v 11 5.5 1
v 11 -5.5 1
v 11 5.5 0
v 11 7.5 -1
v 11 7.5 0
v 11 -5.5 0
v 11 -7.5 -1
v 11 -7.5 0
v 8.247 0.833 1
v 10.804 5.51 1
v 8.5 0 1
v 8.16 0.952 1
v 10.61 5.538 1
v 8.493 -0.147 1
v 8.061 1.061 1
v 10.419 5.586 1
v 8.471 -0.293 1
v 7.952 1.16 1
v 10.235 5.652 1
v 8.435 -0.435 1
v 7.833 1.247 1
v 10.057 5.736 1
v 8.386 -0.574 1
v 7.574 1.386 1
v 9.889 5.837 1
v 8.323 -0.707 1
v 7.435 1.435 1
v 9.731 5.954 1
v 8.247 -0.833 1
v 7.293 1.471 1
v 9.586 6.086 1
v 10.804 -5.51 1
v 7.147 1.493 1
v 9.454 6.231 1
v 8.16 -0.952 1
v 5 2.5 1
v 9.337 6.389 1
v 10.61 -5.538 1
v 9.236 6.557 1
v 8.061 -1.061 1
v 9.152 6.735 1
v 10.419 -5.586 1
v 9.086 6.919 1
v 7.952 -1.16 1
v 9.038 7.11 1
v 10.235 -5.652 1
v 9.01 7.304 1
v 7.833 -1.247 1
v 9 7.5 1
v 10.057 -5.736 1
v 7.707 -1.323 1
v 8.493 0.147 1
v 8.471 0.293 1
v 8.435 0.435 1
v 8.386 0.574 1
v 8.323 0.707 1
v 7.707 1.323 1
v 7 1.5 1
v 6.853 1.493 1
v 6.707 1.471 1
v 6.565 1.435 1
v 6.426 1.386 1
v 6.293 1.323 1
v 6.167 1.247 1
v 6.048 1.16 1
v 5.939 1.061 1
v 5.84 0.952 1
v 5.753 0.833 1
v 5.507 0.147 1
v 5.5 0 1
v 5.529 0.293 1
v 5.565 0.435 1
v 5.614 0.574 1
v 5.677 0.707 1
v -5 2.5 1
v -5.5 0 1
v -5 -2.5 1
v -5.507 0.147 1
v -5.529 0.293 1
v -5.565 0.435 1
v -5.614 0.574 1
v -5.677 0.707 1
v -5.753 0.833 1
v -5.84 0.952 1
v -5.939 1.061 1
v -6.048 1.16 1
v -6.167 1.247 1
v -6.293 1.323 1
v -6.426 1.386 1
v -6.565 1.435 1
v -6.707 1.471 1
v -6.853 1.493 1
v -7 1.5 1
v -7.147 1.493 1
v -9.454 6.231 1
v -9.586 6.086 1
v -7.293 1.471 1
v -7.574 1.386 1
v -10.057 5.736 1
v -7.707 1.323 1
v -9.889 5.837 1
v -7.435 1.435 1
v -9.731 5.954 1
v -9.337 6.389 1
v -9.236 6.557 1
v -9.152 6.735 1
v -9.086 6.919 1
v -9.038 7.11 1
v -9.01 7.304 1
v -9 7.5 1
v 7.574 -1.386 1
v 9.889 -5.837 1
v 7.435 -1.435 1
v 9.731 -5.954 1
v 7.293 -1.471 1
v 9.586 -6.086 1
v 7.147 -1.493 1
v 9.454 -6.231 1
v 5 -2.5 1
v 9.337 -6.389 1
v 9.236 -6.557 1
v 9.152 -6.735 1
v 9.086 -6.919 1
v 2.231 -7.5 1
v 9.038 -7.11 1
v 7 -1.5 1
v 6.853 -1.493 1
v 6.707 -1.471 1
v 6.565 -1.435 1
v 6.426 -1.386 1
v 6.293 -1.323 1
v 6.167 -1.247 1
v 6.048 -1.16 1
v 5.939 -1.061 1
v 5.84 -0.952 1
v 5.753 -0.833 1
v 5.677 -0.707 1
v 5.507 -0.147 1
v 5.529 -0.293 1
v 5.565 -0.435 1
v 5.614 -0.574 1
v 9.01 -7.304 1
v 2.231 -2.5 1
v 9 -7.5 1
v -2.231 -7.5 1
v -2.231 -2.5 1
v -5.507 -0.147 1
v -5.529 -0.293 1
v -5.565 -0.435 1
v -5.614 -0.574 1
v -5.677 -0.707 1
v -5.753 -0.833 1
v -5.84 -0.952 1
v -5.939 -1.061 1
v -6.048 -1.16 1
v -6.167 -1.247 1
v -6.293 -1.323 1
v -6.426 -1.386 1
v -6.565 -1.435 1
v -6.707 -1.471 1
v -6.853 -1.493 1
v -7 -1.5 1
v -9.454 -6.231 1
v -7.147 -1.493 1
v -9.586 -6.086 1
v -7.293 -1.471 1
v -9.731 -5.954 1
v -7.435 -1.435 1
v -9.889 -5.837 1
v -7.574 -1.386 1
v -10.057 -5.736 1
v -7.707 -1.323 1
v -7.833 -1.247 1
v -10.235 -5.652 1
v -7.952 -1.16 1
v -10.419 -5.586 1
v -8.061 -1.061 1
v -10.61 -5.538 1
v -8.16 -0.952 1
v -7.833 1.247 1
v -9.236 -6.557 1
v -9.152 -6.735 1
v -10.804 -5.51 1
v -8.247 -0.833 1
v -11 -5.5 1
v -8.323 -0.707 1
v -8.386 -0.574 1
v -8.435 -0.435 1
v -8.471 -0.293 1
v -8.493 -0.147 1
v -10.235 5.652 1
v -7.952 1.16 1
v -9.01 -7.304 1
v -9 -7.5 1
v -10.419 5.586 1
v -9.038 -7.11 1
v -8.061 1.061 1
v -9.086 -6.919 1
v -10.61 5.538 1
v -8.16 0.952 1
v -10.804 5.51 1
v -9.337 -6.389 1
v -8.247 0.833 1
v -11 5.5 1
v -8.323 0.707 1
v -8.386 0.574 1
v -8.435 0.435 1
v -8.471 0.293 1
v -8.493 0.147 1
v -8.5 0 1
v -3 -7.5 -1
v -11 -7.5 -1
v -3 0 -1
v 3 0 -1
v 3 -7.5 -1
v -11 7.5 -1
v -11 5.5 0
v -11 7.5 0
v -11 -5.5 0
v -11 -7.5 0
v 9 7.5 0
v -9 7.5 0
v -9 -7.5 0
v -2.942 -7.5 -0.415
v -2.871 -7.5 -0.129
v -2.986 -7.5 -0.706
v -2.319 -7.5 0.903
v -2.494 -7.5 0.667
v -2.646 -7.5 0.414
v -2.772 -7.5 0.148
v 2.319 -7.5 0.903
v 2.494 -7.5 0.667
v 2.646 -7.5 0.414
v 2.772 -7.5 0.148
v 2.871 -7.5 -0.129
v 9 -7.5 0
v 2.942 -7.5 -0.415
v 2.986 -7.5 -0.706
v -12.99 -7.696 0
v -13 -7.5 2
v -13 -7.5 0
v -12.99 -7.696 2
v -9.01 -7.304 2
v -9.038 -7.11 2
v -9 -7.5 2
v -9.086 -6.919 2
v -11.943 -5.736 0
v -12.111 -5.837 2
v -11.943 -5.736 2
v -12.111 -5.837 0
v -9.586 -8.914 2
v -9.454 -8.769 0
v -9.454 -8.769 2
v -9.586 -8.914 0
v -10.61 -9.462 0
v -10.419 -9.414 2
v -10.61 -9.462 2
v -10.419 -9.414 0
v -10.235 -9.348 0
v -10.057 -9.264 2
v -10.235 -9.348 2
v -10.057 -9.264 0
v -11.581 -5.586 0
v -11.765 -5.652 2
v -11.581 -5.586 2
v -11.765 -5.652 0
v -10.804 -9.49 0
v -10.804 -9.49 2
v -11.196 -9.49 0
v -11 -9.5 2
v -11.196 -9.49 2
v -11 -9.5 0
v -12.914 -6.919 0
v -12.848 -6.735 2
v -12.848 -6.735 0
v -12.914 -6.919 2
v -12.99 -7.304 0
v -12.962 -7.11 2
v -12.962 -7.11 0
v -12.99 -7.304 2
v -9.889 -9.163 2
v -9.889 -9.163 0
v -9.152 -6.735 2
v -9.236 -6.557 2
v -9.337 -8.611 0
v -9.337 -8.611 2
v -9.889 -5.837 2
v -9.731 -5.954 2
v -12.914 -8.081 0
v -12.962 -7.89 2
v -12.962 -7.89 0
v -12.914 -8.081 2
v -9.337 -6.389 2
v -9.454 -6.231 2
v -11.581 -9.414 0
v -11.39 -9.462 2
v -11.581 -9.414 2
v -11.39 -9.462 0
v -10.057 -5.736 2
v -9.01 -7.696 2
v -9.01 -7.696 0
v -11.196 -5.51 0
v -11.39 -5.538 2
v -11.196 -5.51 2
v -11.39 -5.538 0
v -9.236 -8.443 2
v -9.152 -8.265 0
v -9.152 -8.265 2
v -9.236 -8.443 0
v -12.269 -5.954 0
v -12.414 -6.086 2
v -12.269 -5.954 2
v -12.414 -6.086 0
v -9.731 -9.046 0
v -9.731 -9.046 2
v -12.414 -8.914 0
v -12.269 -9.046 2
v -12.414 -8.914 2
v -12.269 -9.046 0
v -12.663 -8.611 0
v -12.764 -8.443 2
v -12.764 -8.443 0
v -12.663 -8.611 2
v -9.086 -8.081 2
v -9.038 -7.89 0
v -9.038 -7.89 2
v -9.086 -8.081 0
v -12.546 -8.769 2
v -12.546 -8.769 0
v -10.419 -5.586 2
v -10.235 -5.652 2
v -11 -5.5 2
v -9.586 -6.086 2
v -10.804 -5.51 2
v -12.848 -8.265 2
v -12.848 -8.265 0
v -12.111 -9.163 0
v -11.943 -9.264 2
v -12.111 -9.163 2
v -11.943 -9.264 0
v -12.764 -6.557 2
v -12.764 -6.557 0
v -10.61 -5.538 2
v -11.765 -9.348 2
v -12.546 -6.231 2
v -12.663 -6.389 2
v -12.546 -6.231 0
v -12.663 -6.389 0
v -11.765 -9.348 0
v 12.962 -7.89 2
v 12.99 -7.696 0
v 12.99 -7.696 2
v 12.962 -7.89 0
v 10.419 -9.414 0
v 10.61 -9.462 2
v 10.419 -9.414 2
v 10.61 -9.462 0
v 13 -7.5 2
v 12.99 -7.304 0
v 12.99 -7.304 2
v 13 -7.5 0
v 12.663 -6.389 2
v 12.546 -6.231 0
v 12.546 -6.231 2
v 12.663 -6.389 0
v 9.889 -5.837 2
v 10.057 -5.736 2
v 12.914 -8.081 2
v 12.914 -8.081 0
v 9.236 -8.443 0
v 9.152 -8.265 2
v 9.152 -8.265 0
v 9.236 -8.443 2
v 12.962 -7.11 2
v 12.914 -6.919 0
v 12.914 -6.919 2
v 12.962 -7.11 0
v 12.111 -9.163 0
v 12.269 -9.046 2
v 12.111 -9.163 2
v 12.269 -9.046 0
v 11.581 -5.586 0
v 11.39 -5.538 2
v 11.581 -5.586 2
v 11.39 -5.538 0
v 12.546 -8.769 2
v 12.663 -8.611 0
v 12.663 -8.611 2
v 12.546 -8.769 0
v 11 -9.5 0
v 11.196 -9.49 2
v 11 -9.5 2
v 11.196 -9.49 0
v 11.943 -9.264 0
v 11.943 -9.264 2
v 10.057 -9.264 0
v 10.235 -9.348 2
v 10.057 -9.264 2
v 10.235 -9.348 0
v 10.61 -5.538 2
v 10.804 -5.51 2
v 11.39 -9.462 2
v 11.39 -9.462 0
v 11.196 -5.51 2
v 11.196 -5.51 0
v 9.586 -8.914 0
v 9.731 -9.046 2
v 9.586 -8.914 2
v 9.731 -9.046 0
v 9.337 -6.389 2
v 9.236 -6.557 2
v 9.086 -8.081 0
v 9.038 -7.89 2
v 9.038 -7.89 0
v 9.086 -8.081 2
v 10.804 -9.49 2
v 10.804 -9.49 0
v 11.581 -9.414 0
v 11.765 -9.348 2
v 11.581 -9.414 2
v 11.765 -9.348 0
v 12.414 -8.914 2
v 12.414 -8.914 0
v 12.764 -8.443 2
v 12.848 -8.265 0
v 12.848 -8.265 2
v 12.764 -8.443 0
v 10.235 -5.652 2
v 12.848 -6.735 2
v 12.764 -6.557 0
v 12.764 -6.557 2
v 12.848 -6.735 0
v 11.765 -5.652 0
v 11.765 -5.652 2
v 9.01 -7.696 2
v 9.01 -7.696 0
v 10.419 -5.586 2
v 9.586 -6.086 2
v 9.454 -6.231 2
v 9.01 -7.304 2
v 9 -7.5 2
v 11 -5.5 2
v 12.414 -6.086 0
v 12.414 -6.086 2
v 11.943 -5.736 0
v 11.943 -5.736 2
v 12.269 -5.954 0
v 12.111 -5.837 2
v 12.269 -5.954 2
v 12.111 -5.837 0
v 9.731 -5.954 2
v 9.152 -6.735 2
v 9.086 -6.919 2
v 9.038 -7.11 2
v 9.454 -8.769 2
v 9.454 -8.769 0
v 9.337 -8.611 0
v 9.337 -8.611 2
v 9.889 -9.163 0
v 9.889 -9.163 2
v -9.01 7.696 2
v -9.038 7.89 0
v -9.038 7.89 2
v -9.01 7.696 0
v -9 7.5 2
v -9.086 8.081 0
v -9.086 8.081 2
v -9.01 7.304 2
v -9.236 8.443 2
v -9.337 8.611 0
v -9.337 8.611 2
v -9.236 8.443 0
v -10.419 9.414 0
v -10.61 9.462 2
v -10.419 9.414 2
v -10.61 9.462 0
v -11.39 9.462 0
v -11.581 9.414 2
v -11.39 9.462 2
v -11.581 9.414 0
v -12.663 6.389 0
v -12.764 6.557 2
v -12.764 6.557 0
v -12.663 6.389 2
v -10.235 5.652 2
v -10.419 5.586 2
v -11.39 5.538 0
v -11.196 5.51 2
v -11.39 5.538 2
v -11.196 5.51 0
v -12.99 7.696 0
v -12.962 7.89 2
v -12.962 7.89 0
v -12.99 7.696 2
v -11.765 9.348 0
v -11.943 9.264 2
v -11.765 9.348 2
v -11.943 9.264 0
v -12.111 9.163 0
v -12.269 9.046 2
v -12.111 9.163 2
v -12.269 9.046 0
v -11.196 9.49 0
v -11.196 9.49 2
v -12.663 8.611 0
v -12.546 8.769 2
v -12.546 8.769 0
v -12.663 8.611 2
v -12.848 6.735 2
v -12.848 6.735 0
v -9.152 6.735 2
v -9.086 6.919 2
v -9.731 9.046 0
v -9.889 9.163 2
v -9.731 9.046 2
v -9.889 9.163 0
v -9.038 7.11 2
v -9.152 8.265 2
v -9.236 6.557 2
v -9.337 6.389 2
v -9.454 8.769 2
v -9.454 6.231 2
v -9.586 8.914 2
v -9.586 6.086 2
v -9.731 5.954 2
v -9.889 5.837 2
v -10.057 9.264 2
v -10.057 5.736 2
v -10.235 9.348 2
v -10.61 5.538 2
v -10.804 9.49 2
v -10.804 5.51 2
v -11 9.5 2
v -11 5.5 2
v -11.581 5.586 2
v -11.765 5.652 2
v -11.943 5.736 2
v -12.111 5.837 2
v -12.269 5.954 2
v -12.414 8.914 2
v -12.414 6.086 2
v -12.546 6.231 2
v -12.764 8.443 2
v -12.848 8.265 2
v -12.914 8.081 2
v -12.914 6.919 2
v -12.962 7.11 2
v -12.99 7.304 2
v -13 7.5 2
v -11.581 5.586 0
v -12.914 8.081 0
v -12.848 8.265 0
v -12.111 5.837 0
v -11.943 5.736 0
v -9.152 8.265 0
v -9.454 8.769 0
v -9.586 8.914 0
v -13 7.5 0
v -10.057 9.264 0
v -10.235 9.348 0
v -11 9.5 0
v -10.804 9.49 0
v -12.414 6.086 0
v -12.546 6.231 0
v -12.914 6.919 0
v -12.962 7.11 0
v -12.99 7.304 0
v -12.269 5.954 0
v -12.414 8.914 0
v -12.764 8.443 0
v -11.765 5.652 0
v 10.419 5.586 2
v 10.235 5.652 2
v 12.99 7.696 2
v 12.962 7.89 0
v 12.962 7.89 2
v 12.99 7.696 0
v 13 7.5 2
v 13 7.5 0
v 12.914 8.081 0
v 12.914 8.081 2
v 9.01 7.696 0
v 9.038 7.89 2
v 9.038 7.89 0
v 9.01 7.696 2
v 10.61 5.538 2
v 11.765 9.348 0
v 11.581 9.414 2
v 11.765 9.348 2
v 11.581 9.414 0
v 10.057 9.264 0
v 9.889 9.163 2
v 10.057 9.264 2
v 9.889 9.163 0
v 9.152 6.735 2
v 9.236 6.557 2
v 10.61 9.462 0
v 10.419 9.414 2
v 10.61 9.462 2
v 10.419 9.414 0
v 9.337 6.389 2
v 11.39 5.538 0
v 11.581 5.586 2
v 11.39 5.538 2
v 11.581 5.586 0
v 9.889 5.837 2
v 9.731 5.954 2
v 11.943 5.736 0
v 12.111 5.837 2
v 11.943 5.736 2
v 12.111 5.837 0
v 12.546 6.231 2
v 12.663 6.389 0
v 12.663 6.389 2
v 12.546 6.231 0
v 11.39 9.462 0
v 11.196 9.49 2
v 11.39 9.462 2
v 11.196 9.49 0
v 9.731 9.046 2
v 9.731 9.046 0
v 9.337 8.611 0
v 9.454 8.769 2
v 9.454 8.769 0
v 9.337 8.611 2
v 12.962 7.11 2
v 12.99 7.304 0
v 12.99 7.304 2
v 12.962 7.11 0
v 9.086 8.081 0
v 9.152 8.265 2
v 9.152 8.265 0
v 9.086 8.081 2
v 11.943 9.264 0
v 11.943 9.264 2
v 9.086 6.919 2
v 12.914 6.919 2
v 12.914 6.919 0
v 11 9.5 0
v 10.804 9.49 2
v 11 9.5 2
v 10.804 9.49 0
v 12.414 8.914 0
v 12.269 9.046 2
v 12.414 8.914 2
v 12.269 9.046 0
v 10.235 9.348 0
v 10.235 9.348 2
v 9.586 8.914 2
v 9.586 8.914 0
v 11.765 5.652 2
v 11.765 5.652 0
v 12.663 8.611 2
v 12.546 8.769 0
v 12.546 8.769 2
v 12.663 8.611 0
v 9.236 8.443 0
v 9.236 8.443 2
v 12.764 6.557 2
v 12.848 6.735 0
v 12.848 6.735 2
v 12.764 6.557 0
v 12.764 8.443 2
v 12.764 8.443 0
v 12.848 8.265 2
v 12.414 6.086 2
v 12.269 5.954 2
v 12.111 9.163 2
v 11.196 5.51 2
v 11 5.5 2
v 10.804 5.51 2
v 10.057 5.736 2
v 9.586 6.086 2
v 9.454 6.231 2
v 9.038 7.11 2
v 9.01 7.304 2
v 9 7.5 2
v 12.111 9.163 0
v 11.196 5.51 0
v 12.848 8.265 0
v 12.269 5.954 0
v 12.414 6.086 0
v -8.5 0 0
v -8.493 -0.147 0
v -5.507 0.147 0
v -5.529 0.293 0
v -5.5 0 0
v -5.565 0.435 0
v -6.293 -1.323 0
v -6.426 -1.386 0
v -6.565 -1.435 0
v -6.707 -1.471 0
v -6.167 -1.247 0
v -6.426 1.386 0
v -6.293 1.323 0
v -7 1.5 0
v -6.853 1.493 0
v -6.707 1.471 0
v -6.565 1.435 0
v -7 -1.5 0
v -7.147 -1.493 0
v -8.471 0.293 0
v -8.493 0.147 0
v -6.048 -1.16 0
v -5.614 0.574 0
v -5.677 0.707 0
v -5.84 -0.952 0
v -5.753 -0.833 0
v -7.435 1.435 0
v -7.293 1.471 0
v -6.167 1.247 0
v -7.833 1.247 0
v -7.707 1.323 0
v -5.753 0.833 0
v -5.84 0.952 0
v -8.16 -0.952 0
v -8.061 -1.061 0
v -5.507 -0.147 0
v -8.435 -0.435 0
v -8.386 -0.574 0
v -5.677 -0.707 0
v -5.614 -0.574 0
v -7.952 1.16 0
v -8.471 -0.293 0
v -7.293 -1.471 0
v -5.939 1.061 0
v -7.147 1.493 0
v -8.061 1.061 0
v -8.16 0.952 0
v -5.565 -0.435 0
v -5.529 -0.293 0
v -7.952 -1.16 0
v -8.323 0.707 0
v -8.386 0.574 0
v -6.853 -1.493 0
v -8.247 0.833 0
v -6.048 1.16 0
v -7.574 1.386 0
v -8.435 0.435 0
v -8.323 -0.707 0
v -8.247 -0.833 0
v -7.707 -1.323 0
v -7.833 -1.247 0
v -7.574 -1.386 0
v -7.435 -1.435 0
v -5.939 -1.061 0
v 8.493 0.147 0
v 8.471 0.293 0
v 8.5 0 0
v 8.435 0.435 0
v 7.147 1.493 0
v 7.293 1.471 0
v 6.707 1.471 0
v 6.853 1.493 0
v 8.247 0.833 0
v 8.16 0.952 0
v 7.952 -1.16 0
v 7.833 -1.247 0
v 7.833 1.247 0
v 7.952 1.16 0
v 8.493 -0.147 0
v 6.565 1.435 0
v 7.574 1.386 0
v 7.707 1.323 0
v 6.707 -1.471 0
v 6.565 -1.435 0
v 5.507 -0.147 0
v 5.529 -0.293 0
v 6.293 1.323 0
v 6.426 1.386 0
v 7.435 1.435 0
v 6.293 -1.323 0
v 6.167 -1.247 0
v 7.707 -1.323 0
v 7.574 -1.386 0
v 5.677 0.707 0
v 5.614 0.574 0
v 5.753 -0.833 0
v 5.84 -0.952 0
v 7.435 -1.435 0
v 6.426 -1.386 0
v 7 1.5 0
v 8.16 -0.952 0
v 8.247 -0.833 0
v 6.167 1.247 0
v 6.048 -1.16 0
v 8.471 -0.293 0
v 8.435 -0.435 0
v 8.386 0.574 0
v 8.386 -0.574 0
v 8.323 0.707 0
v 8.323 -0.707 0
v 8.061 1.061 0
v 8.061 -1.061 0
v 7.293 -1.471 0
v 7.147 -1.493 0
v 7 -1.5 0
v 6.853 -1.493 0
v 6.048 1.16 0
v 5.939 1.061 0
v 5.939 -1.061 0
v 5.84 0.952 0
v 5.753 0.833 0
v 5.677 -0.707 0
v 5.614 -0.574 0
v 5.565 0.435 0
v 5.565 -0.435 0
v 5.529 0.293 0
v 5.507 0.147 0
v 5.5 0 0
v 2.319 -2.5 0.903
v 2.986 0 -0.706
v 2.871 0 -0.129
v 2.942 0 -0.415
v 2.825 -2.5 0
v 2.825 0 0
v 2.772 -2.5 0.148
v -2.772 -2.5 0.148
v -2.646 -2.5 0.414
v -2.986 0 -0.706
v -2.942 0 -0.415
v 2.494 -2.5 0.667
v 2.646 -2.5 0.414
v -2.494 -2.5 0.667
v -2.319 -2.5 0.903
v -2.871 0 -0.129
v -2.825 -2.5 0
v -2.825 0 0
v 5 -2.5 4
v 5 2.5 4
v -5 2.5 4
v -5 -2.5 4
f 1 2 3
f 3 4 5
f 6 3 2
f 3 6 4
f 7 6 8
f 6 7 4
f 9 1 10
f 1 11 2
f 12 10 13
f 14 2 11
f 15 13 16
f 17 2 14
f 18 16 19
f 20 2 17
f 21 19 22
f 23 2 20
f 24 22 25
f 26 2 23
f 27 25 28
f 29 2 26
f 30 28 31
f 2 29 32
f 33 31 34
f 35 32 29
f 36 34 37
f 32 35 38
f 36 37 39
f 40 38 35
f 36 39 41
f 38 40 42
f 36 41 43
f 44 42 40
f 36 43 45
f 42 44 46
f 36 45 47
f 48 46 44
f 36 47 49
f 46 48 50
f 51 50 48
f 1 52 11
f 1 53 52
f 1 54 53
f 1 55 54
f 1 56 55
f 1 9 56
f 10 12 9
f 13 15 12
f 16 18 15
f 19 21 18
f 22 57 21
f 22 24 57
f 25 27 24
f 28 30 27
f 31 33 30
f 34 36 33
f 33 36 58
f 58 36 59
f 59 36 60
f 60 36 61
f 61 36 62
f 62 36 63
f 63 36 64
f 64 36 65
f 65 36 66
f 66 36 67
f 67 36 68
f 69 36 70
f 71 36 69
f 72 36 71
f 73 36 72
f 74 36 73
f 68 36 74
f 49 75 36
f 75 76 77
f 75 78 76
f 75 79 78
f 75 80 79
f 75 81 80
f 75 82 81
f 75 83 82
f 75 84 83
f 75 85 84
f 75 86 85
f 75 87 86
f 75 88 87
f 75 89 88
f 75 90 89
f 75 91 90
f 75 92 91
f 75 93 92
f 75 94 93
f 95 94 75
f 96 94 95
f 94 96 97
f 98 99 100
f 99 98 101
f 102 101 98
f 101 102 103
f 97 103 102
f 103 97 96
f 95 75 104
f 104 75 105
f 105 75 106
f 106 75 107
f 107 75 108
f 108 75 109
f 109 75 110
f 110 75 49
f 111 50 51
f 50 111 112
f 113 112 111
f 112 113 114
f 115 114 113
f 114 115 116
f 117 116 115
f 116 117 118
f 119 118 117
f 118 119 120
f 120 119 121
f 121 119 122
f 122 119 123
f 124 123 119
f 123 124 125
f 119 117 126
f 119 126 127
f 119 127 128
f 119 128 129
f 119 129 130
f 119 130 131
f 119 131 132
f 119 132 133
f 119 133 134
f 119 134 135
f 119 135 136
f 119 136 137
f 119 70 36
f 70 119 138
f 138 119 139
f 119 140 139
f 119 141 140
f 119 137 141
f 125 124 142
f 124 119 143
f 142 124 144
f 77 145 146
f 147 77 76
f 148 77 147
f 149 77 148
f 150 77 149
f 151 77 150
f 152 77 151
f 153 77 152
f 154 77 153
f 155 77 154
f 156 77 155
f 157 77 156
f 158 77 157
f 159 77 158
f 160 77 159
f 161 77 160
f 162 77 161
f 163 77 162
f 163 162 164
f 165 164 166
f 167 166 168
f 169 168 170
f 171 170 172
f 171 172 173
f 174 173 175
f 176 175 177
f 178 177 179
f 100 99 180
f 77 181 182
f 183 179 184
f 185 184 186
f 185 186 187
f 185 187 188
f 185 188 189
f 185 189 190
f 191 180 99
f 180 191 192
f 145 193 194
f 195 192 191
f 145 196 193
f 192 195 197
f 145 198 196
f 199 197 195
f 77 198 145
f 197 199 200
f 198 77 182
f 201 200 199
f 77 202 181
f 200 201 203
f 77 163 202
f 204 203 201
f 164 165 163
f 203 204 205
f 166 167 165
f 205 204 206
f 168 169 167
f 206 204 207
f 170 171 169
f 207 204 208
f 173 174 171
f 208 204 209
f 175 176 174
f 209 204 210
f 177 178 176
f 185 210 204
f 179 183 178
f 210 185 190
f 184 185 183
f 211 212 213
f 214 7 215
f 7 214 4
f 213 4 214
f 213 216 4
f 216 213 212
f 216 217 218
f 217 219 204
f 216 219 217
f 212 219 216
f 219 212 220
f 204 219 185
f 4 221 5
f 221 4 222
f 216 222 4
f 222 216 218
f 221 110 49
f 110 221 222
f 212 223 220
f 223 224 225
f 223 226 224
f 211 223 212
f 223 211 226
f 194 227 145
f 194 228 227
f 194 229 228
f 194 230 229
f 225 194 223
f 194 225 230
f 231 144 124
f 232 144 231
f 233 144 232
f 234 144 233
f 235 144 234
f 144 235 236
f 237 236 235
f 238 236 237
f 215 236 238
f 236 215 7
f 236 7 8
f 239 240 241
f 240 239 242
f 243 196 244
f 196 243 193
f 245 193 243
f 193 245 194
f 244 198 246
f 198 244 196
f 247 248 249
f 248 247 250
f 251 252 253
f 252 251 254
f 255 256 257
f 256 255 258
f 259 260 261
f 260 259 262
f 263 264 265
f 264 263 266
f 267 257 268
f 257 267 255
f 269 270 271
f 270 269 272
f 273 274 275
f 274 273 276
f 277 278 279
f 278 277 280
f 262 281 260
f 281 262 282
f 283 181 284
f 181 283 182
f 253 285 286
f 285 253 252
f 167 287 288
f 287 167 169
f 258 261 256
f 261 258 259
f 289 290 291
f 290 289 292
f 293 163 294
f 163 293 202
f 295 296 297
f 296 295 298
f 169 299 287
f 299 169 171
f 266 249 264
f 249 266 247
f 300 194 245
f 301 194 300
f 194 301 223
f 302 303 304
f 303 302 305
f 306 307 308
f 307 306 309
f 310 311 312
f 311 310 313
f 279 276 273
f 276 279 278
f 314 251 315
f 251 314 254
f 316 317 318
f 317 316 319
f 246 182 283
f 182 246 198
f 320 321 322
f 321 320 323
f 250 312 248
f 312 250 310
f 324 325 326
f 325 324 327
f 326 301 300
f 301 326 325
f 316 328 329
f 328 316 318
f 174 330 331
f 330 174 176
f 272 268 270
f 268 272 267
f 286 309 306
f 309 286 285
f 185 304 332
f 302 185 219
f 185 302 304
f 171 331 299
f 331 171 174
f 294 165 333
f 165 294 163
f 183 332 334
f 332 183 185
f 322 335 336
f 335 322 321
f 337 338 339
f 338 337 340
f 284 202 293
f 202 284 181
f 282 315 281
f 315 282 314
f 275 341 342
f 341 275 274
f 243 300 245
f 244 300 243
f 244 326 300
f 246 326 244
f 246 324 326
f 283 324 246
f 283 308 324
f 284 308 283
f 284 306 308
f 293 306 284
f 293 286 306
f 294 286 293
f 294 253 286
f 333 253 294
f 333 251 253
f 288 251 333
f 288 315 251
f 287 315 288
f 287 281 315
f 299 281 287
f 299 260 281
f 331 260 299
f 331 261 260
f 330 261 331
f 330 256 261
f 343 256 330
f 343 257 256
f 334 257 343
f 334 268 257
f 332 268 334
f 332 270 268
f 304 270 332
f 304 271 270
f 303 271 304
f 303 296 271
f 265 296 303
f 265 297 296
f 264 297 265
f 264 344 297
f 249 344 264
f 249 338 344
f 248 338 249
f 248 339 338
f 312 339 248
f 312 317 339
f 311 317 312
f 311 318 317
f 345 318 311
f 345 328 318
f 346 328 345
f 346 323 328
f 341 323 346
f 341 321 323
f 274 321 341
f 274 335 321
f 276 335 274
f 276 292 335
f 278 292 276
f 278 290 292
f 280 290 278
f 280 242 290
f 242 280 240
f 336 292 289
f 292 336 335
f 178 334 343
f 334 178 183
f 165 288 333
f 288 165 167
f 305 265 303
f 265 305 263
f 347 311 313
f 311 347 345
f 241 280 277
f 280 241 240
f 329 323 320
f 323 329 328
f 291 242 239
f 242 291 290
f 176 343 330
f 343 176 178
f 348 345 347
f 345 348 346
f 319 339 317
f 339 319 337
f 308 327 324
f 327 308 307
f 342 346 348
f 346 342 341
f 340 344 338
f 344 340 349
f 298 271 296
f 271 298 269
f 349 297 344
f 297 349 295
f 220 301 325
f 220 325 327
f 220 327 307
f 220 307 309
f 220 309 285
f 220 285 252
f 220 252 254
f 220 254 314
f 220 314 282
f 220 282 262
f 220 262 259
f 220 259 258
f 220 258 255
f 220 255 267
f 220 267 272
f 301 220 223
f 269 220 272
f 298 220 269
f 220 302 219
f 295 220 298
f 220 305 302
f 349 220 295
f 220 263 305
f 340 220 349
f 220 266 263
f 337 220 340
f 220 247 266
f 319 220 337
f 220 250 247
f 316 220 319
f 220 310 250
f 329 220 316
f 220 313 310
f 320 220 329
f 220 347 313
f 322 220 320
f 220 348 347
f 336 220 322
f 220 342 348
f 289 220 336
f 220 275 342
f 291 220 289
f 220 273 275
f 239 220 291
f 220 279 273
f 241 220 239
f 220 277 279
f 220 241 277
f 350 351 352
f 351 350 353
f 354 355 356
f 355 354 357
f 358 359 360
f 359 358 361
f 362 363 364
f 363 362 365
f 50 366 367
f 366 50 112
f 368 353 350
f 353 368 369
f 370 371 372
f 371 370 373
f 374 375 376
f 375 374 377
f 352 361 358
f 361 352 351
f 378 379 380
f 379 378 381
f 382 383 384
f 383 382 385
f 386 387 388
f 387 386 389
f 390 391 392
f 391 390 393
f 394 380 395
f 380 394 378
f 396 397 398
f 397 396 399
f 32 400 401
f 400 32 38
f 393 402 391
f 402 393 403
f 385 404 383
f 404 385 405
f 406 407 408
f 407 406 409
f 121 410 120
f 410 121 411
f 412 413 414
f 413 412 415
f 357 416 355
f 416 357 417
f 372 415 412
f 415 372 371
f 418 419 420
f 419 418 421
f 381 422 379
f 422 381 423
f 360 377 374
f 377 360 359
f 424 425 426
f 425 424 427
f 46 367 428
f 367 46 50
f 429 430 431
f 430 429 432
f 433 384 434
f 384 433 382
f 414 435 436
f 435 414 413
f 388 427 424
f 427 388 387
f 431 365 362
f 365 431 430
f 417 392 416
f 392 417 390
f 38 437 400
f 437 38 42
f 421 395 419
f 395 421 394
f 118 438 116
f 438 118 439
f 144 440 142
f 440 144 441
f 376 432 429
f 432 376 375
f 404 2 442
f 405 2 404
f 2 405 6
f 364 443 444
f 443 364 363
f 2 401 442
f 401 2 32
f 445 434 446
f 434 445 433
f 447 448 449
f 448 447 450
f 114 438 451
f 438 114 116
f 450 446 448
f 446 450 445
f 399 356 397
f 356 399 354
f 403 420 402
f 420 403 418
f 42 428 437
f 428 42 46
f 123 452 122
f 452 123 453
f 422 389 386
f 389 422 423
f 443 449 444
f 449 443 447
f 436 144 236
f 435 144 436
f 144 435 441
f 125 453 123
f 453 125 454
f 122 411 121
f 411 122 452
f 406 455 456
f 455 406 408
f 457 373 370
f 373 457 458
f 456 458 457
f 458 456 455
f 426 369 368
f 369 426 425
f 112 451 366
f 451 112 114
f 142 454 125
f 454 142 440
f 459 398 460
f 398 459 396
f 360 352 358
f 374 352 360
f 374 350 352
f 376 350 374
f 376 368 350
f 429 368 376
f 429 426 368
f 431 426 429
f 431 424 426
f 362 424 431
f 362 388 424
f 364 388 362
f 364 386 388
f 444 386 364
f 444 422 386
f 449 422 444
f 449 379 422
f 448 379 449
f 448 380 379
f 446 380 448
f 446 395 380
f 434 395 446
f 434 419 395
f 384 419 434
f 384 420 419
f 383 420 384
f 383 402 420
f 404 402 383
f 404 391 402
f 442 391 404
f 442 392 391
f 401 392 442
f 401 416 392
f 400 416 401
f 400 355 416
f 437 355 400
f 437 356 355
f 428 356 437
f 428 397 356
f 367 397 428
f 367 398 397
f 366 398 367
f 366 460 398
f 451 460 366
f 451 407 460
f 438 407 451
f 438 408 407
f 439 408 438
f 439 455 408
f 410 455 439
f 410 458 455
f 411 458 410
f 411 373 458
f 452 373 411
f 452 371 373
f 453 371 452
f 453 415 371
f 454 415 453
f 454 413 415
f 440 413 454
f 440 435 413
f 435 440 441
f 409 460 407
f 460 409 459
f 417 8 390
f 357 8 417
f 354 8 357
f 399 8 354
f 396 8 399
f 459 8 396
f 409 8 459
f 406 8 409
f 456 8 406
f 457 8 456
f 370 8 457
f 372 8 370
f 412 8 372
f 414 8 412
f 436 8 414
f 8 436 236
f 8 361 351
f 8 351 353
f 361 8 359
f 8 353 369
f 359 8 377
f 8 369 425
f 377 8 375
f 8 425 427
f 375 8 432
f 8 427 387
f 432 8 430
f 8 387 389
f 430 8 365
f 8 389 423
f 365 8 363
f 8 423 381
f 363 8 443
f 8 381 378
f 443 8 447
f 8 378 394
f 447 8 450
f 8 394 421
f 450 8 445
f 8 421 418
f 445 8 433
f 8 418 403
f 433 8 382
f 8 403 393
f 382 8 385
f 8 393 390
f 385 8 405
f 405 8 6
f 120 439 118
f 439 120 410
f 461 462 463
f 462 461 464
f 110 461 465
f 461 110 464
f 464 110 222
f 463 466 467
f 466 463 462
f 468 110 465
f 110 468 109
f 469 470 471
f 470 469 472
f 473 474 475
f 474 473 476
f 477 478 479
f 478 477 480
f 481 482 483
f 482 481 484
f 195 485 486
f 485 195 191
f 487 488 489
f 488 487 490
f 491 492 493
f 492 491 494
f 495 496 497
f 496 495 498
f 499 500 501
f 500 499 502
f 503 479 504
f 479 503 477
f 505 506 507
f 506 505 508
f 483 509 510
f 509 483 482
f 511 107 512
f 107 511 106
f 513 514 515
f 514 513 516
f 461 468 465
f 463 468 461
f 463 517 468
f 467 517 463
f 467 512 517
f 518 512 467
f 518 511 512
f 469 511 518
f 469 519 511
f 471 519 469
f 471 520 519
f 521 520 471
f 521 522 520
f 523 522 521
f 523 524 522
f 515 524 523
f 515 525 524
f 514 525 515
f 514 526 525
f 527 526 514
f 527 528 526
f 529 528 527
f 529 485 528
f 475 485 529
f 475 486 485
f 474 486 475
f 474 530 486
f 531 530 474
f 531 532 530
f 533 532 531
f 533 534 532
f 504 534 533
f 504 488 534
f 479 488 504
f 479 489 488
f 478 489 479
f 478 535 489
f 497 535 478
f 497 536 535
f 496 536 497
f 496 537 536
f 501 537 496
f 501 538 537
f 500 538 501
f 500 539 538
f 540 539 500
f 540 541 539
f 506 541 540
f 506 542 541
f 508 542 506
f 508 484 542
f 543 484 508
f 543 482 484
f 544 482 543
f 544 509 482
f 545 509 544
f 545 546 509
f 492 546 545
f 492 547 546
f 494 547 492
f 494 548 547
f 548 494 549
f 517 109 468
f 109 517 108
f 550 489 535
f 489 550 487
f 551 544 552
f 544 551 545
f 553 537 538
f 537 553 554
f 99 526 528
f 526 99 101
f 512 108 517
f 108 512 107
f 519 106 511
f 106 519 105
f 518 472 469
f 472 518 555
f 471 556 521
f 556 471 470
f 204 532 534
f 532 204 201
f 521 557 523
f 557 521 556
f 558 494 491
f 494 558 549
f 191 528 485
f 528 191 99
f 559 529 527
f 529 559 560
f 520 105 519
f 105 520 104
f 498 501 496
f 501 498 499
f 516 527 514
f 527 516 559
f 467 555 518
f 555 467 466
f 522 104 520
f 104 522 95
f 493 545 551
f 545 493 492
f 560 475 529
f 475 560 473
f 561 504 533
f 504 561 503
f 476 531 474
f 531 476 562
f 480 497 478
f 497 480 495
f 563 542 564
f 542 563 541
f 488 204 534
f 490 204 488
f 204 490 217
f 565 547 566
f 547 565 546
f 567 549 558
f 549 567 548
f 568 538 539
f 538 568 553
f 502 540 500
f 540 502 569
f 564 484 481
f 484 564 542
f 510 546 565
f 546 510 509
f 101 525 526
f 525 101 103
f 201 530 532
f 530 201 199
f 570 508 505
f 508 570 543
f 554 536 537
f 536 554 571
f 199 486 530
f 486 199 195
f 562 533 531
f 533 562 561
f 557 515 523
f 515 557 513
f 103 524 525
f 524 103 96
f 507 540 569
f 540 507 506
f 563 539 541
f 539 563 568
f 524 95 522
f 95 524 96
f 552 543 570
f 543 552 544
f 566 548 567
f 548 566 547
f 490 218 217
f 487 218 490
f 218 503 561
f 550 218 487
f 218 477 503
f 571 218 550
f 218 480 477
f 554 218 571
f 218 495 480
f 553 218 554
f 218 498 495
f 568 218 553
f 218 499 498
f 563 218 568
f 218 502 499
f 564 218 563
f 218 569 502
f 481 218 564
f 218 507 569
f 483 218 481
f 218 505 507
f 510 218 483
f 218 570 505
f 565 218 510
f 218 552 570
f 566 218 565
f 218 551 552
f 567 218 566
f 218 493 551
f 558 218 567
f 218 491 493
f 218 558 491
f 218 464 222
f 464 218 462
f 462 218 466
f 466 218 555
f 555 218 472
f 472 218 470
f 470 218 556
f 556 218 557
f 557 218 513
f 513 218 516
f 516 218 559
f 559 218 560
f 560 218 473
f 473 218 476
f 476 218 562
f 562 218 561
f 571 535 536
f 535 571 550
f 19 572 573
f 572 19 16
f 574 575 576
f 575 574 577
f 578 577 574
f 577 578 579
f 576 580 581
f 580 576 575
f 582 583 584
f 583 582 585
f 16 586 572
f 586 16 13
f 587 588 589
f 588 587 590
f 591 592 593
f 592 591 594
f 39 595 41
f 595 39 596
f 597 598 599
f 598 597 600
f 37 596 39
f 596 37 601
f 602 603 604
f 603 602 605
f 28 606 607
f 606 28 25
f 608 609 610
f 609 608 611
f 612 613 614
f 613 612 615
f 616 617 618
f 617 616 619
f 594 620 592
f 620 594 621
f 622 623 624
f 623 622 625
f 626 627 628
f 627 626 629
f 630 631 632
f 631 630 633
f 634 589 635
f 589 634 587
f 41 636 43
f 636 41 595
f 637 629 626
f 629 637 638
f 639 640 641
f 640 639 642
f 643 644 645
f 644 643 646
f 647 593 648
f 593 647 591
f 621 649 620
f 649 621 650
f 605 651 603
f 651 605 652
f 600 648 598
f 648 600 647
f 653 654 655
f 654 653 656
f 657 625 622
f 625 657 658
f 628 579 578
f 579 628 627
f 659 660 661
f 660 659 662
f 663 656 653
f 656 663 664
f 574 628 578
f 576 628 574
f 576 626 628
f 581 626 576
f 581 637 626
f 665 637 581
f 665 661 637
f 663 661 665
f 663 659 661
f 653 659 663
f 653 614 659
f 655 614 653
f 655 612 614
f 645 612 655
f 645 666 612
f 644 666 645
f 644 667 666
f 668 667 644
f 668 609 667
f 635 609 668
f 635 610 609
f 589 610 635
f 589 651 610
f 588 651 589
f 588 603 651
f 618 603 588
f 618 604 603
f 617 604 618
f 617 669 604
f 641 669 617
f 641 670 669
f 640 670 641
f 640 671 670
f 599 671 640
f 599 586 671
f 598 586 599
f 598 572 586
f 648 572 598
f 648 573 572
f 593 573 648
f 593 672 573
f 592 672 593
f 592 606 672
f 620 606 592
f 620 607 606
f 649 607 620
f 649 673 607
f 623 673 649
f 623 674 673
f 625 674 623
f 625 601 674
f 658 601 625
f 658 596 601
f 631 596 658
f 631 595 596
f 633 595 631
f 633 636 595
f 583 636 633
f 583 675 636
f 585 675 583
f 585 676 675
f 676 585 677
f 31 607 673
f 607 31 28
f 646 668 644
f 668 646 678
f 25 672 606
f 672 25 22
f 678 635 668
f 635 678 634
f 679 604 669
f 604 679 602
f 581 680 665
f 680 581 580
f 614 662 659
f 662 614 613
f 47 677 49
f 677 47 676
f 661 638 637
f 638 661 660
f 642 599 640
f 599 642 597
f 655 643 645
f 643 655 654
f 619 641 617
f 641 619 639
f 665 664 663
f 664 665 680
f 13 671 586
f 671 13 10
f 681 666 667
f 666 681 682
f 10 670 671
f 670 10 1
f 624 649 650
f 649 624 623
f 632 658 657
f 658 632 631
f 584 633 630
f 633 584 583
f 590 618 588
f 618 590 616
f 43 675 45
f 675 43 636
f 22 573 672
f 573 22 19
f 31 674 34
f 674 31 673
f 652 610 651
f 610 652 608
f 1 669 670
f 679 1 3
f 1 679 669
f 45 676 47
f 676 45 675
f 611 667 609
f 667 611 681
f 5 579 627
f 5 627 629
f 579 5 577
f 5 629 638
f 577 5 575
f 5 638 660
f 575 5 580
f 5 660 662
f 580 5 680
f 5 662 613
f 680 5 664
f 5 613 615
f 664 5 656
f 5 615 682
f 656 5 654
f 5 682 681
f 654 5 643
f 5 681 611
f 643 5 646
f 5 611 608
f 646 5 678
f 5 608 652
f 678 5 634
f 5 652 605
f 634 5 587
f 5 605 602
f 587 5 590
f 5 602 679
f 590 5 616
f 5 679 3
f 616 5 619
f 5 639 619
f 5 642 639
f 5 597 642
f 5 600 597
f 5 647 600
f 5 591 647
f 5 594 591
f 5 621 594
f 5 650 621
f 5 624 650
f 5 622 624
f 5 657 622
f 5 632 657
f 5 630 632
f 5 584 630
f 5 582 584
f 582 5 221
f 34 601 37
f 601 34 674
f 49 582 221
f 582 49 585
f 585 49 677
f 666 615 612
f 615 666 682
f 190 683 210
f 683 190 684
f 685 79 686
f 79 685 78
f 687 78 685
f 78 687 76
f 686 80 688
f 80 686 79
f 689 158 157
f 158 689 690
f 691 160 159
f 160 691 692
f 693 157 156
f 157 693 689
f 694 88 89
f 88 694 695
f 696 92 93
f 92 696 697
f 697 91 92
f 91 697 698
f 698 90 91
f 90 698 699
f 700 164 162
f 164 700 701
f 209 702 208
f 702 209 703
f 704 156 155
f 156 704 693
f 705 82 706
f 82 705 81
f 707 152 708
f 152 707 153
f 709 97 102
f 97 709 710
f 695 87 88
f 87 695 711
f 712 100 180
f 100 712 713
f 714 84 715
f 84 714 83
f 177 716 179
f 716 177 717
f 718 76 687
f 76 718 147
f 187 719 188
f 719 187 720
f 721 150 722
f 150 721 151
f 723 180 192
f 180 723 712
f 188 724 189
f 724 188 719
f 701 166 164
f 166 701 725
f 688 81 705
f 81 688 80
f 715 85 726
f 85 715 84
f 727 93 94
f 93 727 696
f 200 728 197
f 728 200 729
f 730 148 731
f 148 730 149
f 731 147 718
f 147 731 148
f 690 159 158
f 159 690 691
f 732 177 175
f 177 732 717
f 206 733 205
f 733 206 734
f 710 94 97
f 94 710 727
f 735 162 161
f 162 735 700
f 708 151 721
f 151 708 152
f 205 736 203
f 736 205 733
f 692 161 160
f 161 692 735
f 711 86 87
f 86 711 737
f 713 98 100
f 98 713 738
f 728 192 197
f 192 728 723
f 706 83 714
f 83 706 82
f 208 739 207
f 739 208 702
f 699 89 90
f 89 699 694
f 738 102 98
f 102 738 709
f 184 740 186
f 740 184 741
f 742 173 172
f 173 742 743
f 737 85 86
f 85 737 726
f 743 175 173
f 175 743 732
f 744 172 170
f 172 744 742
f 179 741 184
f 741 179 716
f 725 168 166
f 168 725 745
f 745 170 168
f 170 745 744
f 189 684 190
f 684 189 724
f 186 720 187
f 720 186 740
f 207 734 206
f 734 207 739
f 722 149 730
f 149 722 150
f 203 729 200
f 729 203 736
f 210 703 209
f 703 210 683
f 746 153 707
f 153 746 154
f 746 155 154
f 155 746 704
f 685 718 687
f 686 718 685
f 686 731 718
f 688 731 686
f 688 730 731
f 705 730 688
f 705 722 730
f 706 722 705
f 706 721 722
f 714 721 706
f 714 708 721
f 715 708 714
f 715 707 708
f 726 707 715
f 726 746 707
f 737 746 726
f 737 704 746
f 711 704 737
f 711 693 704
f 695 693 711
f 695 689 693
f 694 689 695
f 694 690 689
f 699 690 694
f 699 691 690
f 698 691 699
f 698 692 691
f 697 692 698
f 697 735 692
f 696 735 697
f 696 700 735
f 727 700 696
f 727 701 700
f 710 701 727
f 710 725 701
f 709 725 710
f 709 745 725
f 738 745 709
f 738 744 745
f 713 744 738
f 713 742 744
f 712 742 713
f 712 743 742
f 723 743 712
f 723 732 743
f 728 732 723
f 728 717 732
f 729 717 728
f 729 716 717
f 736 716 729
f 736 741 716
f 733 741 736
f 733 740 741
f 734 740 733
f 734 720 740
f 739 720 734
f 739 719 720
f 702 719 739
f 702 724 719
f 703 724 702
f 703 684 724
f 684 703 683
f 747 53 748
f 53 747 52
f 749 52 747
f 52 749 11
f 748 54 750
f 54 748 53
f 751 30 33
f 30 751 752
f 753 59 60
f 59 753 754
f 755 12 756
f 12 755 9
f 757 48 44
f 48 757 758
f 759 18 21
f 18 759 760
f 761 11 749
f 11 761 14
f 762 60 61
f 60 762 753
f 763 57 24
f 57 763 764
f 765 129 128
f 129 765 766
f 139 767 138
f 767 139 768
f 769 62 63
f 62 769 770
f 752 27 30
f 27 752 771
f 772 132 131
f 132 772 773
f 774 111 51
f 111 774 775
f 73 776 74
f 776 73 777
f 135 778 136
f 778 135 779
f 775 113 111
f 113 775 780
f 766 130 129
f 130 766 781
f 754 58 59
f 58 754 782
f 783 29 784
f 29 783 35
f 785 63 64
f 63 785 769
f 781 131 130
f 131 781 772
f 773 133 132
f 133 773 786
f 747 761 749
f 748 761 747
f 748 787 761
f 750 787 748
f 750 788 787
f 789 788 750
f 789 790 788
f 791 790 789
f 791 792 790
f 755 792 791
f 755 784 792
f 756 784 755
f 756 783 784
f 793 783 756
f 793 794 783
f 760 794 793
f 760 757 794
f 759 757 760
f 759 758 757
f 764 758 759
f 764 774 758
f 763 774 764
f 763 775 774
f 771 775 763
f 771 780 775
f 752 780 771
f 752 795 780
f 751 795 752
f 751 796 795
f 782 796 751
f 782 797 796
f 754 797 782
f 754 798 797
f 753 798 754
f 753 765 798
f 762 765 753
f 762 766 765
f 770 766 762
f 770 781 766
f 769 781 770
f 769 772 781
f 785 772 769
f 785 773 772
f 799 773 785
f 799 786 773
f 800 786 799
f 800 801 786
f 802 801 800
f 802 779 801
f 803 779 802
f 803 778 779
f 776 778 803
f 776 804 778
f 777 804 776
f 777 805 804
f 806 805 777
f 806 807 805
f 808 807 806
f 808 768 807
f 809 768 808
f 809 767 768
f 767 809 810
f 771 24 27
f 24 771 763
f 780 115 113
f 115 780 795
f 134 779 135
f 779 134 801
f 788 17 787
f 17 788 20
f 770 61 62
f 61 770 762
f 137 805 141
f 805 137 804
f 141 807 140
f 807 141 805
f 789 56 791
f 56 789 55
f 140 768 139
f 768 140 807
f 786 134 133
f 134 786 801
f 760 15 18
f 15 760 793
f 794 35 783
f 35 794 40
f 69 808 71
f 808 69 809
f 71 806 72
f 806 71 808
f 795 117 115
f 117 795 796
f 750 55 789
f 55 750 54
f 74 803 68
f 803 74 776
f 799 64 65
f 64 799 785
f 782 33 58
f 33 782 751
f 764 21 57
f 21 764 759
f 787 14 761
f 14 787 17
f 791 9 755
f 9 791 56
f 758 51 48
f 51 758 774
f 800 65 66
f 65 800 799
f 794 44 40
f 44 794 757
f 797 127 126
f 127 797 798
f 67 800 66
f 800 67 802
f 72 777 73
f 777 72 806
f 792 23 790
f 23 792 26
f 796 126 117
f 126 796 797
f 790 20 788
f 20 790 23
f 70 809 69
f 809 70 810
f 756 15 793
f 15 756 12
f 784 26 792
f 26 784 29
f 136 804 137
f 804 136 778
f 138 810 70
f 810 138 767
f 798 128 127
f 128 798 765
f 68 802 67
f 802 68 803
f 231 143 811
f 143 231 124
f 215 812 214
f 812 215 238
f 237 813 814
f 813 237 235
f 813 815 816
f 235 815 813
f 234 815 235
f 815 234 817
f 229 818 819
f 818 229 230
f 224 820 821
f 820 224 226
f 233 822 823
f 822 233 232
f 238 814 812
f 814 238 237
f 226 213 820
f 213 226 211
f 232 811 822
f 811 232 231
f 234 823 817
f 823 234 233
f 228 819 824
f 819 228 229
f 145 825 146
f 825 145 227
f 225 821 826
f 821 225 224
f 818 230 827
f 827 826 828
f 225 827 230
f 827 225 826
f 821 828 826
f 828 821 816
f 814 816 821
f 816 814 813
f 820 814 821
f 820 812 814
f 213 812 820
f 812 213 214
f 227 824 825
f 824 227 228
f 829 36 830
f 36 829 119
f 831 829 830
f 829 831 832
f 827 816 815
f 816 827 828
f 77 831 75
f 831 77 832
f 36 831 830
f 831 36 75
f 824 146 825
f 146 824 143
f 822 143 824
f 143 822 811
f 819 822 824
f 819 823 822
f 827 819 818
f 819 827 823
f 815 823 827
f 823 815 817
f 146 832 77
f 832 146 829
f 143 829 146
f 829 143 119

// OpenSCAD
module mounting_bracket() {
    difference() {
        // Base plate with rounded corners
        union() {
            // Main rectangular base
            cube([22, 15, 2], center = true);
            // Rounded corners
            translate([-11, -7.5, 0])
                cylinder(h = 2, r = 2, $fn = 64);
            translate([11, -7.5, 0])
                cylinder(h = 2, r = 2, $fn = 64);
            translate([-11, 7.5, 0])
                cylinder(h = 2, r = 2, $fn = 64);
            translate([11, 7.5, 0])
                cylinder(h = 2, r = 2, $fn = 64);
        }
        
        // Through-holes
        translate([-7, 0, 0])
            cylinder(h = 10, r = 1.5, $fn = 64);
        translate([7, 0, 0])
            cylinder(h = 10, r = 1.5, $fn = 64);
        
        // Semicylindrical cutout
        translate([0, 0, -1])
            rotate([90, 0, 0])
            cylinder(h = 15, r = 3, $fn = 64);
    }
    
    // Rectangular boss
    translate([0, 0, 2])
        cube([10, 5, 4], center = true);
}

mounting_bracket();
